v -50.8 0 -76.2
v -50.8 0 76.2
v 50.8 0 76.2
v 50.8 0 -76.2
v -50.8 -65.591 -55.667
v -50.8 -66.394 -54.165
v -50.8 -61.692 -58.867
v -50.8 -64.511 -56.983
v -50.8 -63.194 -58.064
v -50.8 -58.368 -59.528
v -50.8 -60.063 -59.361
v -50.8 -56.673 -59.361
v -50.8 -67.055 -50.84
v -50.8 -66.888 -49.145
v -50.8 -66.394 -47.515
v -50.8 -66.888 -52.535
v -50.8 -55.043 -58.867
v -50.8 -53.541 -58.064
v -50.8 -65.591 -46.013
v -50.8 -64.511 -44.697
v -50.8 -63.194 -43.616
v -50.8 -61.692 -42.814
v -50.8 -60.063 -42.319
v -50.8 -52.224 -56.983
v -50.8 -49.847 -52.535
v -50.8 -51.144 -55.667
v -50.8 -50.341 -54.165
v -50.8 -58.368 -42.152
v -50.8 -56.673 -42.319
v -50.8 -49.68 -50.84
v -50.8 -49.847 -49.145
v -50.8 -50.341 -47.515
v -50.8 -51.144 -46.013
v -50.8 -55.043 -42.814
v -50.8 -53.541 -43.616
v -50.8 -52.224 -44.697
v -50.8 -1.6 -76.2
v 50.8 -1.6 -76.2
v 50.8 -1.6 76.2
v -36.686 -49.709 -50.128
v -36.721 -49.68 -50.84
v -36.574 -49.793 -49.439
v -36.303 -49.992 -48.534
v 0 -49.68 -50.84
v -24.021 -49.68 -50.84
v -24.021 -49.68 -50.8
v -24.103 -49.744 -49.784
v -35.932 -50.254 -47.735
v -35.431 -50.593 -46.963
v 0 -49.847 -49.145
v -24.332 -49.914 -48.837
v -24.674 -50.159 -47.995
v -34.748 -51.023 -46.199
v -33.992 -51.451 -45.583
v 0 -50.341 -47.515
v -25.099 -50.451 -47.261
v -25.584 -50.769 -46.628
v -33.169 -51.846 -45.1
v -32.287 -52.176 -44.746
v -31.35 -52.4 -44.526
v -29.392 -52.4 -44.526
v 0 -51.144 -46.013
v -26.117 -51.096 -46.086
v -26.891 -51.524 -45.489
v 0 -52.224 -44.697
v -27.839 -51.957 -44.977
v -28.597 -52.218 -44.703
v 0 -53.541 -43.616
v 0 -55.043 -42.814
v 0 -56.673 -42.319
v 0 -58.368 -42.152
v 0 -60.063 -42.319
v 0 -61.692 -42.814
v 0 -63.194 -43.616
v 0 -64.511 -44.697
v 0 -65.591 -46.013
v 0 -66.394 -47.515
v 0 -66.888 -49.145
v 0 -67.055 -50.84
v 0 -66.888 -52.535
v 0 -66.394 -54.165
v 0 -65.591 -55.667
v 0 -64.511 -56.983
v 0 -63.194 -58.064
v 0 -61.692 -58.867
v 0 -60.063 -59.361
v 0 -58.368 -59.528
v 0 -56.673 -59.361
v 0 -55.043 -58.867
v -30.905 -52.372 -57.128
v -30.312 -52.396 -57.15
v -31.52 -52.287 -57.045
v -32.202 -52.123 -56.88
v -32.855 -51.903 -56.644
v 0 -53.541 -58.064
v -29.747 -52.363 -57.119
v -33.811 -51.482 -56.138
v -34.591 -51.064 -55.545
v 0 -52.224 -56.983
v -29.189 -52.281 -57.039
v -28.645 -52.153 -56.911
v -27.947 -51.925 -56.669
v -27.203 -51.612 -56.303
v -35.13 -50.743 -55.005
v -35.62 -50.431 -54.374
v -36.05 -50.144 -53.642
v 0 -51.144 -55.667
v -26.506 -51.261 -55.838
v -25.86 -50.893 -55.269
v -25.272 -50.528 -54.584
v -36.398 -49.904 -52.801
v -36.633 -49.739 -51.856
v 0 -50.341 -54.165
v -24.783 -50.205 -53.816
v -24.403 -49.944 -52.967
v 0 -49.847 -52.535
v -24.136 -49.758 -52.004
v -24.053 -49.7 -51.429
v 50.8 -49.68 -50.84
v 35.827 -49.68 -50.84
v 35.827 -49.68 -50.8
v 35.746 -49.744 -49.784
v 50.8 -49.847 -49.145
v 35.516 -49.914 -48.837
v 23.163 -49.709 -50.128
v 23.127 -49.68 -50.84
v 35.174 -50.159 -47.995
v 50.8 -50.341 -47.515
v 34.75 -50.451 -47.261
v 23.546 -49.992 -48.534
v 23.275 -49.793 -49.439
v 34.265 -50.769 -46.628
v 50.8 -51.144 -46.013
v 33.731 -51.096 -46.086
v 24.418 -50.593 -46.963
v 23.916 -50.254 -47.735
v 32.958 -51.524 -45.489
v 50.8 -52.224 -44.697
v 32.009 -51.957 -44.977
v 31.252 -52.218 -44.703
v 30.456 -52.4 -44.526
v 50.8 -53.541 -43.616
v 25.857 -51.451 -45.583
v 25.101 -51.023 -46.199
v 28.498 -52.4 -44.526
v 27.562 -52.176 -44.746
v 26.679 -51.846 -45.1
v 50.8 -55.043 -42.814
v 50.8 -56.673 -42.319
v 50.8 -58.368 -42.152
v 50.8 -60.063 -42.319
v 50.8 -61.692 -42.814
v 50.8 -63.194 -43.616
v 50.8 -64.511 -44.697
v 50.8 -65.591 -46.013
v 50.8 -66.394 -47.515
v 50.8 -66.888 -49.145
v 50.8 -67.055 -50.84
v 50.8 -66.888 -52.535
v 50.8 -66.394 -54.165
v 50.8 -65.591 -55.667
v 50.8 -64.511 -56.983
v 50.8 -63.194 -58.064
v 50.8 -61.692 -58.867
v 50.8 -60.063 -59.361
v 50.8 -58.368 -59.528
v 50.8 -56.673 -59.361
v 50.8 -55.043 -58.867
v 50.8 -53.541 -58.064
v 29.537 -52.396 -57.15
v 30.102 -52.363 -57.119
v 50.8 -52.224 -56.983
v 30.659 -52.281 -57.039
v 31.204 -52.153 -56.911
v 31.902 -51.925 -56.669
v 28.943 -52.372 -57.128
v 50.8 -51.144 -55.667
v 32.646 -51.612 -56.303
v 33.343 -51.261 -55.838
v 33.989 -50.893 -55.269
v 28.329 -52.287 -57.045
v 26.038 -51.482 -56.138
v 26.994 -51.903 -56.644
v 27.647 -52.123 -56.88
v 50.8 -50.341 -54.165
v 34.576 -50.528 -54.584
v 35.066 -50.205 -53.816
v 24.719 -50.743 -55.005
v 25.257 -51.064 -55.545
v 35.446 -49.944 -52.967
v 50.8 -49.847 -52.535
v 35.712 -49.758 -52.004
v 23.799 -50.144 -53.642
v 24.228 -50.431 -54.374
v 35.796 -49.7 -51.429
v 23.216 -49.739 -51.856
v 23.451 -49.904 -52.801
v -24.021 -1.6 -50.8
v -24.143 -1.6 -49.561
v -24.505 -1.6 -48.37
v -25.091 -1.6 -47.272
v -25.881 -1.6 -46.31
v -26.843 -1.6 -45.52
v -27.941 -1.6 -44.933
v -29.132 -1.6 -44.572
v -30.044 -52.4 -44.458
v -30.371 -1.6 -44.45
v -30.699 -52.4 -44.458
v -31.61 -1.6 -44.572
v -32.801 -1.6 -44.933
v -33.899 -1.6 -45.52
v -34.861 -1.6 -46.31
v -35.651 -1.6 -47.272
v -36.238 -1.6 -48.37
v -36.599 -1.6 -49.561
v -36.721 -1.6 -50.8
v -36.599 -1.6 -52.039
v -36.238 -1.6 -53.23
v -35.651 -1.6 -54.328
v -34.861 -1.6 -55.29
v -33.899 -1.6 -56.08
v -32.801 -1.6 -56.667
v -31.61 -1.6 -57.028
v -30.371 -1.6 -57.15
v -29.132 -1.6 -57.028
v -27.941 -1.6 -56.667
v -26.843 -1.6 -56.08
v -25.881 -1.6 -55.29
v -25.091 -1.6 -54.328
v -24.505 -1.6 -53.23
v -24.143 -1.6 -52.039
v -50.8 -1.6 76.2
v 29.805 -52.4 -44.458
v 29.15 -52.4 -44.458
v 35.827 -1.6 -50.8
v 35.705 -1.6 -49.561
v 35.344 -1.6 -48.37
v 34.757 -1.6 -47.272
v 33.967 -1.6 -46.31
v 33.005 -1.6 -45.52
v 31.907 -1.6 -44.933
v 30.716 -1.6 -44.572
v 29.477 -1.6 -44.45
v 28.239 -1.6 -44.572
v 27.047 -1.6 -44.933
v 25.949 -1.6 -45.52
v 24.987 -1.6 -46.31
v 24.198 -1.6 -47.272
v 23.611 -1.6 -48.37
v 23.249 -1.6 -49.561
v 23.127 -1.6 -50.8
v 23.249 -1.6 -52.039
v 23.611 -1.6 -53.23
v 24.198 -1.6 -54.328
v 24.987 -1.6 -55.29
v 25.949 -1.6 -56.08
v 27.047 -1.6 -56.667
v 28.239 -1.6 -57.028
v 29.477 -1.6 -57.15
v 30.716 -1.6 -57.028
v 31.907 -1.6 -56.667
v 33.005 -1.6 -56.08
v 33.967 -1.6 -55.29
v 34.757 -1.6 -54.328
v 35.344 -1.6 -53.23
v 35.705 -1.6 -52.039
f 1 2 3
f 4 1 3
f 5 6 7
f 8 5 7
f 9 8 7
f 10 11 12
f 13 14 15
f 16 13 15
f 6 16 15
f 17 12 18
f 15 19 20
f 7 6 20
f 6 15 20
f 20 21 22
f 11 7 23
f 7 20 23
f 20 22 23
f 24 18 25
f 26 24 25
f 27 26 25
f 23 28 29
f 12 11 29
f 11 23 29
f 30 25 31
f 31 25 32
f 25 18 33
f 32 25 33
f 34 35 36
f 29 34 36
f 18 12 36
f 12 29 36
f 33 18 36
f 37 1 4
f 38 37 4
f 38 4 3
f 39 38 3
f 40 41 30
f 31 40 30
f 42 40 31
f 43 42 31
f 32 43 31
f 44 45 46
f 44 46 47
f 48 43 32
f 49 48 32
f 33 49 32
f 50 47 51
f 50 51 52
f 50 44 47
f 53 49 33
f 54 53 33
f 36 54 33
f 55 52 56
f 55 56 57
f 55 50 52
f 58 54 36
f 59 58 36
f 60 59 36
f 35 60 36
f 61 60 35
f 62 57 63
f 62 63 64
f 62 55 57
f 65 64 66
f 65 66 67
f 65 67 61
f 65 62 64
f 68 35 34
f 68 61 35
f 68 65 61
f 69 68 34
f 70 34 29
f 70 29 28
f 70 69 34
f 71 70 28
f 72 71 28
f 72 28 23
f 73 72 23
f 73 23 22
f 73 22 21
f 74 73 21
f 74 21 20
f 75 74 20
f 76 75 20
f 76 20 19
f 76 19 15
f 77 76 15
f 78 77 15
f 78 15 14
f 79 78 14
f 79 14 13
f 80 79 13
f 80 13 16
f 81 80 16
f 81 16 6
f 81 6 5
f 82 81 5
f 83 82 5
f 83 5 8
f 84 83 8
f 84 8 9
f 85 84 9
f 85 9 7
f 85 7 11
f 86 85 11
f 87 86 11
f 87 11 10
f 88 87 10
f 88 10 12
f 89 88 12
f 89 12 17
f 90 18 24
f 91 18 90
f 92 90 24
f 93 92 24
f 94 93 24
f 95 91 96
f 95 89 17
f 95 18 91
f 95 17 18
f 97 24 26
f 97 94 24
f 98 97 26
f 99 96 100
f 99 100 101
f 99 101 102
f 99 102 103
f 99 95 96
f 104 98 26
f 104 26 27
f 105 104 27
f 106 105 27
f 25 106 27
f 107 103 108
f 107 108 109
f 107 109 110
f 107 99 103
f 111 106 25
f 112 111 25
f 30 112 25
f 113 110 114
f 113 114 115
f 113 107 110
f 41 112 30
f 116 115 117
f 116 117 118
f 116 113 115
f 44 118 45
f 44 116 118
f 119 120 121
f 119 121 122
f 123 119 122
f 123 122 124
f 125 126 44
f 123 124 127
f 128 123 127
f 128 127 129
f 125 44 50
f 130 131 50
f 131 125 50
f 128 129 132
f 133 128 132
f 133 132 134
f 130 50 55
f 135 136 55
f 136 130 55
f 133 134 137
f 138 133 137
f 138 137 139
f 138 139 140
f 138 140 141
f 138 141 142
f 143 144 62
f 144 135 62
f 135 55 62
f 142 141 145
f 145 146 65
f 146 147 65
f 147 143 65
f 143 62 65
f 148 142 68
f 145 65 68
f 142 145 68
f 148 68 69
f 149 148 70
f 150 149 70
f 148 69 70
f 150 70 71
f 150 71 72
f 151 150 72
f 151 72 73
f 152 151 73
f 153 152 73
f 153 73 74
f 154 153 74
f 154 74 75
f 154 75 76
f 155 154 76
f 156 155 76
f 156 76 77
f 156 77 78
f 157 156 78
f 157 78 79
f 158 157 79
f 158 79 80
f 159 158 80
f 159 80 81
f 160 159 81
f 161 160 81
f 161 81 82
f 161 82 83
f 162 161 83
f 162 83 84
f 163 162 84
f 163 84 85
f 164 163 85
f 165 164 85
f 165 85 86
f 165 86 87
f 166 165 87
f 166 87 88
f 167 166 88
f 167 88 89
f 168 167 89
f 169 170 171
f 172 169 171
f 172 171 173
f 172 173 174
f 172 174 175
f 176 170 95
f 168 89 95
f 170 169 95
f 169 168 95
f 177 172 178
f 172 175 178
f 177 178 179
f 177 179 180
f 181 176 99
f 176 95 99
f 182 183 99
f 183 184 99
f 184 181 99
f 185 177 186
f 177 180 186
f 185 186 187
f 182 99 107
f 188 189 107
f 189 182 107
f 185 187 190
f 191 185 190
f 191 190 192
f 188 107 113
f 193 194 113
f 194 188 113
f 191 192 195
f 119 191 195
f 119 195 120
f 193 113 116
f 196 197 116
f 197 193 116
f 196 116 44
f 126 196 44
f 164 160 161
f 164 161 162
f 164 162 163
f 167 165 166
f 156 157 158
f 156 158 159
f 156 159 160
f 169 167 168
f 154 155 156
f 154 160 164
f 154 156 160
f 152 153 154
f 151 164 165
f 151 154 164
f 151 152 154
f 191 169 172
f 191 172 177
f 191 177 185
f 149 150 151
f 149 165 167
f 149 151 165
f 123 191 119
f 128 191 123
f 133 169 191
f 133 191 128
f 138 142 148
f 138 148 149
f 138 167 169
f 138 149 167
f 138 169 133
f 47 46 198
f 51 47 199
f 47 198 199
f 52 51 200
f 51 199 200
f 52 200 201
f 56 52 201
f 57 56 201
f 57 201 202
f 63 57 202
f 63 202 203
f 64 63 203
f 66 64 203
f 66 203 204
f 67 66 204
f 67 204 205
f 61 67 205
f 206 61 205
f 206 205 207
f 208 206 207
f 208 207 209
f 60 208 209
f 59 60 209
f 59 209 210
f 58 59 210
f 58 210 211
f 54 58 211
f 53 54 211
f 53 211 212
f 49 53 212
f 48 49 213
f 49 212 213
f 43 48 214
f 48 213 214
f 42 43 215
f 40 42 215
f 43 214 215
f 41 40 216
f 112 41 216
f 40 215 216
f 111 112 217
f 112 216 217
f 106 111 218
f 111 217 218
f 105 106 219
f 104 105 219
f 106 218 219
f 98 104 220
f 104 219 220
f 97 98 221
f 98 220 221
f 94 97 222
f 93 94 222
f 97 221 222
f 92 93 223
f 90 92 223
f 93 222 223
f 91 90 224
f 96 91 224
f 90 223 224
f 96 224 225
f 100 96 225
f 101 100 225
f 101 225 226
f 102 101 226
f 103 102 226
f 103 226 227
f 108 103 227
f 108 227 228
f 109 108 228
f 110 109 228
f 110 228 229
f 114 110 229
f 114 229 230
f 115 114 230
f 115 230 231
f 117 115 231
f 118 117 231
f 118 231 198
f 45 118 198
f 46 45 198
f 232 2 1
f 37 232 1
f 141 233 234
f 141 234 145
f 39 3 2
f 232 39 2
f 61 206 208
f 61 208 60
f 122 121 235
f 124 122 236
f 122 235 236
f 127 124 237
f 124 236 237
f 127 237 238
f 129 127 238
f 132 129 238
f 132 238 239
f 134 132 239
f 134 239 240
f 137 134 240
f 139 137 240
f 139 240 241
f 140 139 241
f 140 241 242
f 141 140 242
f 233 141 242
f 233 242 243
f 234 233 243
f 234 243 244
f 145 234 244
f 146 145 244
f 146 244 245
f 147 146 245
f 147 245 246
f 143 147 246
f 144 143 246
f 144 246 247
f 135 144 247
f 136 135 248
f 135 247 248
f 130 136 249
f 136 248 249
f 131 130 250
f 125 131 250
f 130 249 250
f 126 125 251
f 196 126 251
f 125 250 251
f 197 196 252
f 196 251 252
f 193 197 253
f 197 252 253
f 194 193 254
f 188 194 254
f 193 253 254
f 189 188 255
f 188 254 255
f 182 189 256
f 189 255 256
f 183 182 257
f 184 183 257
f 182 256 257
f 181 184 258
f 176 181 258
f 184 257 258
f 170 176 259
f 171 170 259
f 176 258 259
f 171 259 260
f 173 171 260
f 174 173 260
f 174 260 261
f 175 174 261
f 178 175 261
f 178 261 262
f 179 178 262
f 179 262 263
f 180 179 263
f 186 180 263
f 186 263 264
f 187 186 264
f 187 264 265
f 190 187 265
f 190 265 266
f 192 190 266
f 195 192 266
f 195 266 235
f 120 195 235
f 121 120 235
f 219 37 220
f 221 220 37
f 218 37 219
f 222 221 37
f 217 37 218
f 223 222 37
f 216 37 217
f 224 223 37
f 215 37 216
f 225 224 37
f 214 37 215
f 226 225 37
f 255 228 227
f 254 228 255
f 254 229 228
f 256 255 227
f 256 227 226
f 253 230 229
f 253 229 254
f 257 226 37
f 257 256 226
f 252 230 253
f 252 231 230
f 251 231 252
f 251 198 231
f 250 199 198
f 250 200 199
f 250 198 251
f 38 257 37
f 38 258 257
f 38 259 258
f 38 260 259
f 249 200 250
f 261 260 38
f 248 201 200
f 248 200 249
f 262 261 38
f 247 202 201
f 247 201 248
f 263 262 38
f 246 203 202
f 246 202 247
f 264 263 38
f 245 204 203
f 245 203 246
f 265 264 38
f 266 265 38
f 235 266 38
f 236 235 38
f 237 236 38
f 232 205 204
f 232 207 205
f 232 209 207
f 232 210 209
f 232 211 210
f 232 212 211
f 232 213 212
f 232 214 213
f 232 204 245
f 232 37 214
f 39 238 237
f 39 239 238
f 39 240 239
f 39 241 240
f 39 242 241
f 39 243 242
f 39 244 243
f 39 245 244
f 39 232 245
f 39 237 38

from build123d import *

# Parameters (mm, degrees)
F1_DEPTH      = 1.6002
F2_R          = 6.35
F3_DEPTH      = 50.8
F4_R          = 8.687802
F5_DEPTH      = 50.8
F5_DEPTH_BACK = 50.8


with BuildPart() as f1:
    # F0 (on Front) → F1 (new body)
    with BuildSketch(Plane.XZ):
        Polygon((0, 76.2), (-50.8, 76.2), (-50.8, 0), (-50.8, -76.2), (0, -76.2), (50.8, -76.2), (50.8, 0), (50.8, 76.2), align=None)
    extrude(amount=F1_DEPTH)

    # F2 (on face) → F3 (join)
    with BuildSketch(Plane.XZ.offset(1.6002)):
        with Locations((-30.371312, -50.8)):
            Circle(F2_R)
        with Locations((29.477347, -50.8)):
            Circle(F2_R)
    extrude(amount=F3_DEPTH)

    # F4 (on Right) → F5 (join, two sides)
    with BuildSketch(Plane.YZ) as f5_sk:
        with Locations((-58.367599, -50.84005)):
            Circle(F4_R)
    extrude(amount=F5_DEPTH)
    extrude(f5_sk.sketch, amount=-F5_DEPTH_BACK)


solid = f1.part
